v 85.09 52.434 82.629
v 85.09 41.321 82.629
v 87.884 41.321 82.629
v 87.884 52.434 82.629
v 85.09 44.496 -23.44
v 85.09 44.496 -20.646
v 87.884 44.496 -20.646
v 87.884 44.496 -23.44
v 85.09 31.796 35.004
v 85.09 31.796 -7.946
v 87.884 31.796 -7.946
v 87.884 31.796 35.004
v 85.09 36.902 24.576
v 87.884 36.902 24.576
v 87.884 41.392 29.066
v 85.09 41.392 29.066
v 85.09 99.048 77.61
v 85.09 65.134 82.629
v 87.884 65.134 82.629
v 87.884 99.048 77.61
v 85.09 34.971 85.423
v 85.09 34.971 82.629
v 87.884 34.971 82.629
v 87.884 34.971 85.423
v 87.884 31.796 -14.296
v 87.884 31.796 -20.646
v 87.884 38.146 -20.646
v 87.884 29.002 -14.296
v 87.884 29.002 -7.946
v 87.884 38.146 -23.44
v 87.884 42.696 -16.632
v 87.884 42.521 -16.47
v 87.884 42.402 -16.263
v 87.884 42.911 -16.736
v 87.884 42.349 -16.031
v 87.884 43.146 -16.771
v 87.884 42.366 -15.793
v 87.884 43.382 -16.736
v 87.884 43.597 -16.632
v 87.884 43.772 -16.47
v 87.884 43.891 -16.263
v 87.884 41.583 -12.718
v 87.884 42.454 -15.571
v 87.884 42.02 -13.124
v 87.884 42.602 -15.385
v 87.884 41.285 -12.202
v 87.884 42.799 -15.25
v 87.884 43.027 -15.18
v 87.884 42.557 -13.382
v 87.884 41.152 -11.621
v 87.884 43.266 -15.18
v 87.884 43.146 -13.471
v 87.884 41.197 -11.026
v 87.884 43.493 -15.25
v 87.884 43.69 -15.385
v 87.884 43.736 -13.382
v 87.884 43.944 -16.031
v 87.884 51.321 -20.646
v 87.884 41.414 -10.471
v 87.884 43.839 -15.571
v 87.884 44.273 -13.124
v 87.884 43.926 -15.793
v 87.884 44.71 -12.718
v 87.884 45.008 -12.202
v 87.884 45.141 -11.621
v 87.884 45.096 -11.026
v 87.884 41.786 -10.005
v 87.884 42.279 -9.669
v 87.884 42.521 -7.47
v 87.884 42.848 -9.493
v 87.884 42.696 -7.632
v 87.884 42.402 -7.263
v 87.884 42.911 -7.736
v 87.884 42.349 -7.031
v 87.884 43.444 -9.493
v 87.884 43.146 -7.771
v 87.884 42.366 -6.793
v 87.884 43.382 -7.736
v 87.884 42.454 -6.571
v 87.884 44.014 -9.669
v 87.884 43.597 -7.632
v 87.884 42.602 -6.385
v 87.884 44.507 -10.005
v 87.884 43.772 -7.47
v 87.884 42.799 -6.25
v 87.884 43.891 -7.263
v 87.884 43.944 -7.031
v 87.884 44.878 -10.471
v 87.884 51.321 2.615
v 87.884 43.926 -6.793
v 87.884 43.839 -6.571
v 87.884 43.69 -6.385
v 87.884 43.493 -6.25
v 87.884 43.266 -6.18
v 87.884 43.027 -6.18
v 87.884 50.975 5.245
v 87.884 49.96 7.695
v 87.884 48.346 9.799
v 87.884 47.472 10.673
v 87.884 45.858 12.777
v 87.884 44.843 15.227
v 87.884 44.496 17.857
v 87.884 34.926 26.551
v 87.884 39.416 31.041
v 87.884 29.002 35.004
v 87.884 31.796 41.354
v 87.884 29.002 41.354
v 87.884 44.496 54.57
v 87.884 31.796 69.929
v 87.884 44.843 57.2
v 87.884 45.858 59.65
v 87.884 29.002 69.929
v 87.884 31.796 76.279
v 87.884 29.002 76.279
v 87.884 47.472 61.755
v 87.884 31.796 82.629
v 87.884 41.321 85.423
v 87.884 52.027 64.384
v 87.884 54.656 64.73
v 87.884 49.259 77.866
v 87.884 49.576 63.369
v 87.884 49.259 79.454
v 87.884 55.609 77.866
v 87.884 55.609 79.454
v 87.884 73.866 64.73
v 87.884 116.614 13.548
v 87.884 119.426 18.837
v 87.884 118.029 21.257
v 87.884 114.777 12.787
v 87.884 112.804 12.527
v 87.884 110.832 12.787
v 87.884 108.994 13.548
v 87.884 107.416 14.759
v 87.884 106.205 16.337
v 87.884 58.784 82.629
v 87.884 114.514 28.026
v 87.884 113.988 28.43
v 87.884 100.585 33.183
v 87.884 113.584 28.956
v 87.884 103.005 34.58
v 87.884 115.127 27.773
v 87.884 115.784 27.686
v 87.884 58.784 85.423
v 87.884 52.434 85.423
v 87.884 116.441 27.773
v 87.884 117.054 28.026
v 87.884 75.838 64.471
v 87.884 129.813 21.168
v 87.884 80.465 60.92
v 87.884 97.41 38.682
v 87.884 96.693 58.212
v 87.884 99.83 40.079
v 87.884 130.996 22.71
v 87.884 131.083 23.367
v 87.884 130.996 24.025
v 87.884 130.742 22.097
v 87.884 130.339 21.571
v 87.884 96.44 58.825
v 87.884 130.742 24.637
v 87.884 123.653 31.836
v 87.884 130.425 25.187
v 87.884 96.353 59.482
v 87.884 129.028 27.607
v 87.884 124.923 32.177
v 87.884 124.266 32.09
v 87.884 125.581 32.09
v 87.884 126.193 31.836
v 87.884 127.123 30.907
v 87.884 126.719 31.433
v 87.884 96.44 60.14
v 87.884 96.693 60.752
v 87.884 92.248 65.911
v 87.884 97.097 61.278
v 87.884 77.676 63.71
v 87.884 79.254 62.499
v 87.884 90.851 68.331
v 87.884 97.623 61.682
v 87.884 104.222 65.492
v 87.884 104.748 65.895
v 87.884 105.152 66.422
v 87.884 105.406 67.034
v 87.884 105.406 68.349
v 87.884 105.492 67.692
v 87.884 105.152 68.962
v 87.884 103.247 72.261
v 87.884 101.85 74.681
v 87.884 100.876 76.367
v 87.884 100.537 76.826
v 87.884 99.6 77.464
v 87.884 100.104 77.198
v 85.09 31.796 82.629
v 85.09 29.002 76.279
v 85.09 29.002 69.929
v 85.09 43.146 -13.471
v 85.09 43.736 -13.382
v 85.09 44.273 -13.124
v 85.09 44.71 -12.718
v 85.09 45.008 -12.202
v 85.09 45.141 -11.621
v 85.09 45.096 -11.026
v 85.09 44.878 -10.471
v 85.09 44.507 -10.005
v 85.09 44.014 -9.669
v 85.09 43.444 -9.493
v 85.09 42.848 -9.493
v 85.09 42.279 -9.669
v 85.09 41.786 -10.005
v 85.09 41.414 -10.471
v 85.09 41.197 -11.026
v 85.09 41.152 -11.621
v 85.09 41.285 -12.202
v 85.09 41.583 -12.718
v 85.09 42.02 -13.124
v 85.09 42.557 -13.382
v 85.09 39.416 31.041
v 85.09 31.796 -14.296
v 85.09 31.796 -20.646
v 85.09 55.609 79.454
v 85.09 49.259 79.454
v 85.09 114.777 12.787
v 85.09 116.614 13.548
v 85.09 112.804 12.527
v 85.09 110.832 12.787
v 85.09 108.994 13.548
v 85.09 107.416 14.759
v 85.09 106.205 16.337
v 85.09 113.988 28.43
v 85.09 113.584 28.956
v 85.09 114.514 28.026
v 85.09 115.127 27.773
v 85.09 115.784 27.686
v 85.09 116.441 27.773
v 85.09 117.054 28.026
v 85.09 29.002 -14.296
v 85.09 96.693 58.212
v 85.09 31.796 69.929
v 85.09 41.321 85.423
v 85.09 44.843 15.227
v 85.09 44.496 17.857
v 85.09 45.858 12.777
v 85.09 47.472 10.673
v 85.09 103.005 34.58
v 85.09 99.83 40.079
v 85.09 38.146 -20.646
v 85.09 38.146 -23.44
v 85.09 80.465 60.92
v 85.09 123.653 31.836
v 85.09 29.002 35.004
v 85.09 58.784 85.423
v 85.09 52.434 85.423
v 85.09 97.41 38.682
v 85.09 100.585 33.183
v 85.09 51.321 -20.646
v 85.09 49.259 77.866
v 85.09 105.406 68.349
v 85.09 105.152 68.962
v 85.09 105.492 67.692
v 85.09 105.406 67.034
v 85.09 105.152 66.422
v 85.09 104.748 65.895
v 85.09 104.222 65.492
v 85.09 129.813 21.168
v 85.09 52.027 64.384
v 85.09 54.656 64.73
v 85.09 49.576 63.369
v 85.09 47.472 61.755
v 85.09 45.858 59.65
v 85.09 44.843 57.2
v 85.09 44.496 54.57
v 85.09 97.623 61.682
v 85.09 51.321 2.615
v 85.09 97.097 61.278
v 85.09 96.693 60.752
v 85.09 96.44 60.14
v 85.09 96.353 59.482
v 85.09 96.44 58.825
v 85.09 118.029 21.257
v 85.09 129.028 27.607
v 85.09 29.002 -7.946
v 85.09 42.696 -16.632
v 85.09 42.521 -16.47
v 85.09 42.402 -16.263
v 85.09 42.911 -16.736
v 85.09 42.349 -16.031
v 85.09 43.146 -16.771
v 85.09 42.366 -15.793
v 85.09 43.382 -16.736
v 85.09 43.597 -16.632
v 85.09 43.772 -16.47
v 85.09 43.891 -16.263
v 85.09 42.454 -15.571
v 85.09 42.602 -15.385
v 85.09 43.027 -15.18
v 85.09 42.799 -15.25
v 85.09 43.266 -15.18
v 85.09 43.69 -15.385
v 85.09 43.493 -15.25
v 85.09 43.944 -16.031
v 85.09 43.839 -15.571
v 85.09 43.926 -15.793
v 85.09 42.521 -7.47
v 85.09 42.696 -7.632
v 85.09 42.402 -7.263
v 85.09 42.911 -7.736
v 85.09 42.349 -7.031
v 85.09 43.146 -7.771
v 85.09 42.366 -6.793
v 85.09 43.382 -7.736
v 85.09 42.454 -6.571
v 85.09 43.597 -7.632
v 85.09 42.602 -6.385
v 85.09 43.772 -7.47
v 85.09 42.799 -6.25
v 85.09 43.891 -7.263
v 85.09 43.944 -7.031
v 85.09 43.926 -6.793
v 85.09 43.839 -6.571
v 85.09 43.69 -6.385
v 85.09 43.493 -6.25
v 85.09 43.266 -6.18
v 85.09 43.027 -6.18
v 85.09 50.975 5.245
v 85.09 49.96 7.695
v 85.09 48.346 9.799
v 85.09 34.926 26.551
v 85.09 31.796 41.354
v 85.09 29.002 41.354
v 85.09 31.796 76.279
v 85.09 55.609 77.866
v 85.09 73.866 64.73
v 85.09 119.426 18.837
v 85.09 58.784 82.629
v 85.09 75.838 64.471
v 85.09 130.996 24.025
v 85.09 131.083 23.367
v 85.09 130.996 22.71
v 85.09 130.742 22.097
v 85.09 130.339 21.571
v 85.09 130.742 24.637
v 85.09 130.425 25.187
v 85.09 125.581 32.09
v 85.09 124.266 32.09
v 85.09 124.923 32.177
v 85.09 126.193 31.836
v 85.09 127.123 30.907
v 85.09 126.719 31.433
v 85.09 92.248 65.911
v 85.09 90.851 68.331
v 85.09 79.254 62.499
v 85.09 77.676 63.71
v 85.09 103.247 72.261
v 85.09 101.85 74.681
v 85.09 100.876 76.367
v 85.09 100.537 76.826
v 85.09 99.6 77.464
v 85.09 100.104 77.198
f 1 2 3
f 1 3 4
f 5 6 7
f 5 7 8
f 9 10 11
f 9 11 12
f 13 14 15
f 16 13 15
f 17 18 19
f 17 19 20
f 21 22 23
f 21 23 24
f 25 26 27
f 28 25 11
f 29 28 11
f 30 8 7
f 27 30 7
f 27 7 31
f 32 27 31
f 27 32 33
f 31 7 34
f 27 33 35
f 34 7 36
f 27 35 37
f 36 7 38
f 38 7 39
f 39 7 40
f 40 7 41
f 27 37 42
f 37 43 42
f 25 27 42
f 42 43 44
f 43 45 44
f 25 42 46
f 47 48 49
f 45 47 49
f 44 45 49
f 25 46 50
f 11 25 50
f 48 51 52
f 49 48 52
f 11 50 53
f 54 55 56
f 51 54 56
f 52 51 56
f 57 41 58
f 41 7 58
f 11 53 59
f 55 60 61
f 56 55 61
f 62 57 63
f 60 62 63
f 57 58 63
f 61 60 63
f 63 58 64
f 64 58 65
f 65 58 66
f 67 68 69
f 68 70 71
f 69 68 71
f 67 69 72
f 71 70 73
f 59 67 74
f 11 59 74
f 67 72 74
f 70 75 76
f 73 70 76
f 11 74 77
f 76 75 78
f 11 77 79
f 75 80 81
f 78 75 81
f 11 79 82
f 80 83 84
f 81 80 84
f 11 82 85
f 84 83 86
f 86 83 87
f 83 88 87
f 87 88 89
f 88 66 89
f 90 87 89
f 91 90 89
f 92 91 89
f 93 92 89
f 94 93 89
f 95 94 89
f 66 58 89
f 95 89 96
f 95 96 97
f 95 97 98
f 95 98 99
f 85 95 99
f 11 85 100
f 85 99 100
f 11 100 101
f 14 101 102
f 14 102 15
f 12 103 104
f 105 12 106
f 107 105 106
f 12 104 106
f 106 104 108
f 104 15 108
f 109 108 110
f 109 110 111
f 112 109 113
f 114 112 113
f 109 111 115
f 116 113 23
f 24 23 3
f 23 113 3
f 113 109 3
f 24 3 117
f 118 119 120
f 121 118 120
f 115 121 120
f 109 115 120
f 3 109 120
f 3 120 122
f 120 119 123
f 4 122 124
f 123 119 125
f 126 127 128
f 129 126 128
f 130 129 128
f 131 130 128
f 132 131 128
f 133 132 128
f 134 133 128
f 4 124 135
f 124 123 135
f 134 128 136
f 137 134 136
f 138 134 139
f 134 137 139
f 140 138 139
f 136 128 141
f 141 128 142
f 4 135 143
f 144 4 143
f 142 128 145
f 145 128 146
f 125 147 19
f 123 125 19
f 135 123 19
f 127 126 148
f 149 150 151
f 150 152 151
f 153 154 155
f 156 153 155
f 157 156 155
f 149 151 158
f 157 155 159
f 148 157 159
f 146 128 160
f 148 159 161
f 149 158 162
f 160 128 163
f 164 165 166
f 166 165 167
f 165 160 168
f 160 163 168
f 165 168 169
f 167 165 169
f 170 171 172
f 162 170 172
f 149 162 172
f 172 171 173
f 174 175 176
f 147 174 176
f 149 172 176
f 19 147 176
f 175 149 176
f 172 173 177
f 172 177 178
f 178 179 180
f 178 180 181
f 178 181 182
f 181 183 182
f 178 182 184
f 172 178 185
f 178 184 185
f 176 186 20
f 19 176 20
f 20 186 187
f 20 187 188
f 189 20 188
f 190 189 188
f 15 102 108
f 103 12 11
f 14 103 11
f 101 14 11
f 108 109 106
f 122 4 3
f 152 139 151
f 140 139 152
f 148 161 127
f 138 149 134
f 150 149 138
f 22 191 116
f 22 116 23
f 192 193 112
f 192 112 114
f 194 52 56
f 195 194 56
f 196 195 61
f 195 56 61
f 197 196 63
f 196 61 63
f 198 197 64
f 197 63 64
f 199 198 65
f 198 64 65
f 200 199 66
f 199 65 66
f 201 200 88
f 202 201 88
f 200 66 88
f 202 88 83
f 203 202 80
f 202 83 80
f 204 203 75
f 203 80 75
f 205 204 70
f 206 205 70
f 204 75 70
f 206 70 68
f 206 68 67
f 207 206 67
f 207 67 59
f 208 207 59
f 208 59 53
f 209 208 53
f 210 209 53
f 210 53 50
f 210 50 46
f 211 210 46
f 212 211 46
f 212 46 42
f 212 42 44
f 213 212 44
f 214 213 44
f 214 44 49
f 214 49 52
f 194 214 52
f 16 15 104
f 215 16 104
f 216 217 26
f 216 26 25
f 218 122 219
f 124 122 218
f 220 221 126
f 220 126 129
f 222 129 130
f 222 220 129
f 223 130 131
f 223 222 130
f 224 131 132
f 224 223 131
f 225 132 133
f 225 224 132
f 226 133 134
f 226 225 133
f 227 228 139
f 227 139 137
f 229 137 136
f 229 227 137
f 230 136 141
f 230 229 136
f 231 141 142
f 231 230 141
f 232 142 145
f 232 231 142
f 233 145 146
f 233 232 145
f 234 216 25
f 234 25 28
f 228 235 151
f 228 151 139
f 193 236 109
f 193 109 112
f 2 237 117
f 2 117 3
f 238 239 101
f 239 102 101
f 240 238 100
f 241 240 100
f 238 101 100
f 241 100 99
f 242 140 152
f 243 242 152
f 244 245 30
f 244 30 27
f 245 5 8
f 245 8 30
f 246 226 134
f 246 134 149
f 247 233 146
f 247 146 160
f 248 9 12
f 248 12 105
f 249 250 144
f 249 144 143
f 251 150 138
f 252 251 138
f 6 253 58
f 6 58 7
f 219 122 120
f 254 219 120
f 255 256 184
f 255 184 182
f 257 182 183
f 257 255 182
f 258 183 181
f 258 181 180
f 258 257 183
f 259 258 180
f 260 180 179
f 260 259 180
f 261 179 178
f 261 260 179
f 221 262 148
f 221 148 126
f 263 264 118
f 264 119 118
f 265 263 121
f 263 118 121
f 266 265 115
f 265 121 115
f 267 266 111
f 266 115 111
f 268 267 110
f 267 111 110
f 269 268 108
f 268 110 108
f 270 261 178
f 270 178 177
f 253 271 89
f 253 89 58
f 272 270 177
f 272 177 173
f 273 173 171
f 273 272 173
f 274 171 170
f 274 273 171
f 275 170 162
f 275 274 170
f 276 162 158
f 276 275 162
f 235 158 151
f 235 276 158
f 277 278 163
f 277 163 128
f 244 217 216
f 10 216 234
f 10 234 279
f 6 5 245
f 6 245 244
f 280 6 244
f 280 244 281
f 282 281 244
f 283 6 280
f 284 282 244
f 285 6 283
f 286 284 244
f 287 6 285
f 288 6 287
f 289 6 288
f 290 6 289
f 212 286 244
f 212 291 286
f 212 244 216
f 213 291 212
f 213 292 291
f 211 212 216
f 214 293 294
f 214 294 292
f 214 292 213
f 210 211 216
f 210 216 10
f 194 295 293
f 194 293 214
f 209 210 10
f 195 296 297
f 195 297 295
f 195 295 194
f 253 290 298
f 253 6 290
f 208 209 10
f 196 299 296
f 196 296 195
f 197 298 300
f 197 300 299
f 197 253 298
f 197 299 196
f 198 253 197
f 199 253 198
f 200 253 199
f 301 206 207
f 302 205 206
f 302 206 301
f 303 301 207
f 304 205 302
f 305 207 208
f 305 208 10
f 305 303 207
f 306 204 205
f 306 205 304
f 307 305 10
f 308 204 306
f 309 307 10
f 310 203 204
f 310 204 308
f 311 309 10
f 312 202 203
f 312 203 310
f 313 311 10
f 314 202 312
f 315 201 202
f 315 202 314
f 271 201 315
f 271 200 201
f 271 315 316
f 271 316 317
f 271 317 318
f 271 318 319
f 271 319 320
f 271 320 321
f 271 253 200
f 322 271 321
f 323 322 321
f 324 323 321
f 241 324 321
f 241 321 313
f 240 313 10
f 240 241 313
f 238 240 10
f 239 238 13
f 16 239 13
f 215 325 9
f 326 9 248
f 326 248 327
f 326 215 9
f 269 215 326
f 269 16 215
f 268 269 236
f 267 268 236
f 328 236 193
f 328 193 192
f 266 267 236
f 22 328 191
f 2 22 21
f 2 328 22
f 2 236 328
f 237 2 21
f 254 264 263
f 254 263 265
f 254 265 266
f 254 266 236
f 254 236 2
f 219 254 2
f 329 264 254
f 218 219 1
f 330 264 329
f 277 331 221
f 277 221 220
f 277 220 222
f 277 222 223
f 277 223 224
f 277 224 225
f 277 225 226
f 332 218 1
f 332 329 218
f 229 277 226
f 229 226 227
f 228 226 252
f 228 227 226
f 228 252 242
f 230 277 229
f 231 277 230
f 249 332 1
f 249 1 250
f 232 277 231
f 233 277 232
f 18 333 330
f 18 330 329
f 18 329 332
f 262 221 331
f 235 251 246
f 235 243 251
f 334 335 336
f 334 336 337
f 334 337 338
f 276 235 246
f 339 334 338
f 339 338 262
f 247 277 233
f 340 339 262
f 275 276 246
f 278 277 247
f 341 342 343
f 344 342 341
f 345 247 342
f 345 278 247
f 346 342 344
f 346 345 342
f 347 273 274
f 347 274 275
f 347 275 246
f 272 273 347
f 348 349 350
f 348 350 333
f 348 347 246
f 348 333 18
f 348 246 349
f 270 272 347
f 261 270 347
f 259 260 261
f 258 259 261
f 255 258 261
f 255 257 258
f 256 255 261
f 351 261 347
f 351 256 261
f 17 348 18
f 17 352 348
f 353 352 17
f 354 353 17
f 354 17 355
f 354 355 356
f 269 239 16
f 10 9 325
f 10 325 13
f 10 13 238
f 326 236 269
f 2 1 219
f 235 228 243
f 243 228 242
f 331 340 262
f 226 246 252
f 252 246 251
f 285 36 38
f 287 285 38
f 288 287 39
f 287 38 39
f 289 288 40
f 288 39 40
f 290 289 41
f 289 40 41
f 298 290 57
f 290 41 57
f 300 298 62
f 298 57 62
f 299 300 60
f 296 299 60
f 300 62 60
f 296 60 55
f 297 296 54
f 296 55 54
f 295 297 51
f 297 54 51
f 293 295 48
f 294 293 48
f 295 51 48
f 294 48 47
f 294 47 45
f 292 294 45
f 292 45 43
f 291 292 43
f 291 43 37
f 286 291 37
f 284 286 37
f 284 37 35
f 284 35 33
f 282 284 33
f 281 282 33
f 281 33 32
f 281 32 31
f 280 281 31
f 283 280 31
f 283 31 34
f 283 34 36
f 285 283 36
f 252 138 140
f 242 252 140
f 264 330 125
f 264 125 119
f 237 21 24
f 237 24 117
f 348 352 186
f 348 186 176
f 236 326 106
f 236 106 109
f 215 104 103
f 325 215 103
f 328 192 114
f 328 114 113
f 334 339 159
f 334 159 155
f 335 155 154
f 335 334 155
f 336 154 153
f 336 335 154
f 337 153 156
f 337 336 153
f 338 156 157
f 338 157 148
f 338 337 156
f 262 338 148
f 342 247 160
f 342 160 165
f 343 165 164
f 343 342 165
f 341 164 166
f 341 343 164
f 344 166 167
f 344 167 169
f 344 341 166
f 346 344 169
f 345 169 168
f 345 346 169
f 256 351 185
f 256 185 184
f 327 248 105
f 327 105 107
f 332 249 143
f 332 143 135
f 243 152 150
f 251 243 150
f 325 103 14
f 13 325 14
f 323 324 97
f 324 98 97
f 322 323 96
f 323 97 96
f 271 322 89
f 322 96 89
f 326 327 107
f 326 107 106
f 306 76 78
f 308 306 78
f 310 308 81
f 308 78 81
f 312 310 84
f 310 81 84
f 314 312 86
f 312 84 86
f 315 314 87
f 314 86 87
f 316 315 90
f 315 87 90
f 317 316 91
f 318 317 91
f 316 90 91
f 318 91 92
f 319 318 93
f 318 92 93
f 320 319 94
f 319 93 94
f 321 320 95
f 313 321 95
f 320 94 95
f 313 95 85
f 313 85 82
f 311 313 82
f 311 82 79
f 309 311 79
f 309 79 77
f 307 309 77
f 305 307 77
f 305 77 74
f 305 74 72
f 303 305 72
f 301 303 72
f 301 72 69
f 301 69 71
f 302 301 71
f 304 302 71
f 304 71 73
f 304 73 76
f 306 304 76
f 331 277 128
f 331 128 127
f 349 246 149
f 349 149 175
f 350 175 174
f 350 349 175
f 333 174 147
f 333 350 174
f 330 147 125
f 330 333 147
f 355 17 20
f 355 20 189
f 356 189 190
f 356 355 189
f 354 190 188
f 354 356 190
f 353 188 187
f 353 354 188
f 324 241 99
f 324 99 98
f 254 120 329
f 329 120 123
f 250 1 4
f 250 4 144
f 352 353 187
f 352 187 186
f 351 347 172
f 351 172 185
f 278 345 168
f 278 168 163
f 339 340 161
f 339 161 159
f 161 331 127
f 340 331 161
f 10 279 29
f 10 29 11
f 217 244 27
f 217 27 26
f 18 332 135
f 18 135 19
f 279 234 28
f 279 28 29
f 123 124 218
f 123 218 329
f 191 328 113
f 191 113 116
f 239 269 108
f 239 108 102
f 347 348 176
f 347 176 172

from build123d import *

# Parameters (mm, degrees)
BOSS_EXTRUDE1_DEPTH = 2.794
SKETCH2_R           = 2
SKETCH2_R_2         = 0.8
SKETCH2_W           = 1.5875
SKETCH2_H           = 6.35
CUT_EXTRUDE1_DEPTH  = 157.484941985
FILLET1_R           = 10.16


with BuildPart() as part:
    # Sketch1 → Boss-Extrude1 (new body)
    with BuildSketch(Plane(origin=(85.09, 0, 0), x_dir=(0, 0, -1), z_dir=(1, 0, 0))):
        with BuildLine():
            Line((-64.730392893, 73.865929303), (-64.730392893, 44.496360983))
            Line((-64.730392893, 44.496360983), (-13.648686174, 44.496360983))
            Line((-13.648686174, 44.496360983), (-6.823686174, 51.321360983))
            Line((-6.823686174, 51.321360983), (20.646158347, 51.321360983))
            Line((20.646158347, 51.321360983), (20.646158347, 44.496360983))
            Line((20.646158347, 44.496360983), (23.440158347, 44.496360983))
            Line((23.440158347, 44.496360983), (23.440158347, 38.146360983))
            Line((23.440158347, 38.146360983), (20.646158347, 38.146360983))
            Line((20.646158347, 38.146360983), (20.646158347, 31.796360983))
            Line((20.646158347, 31.796360983), (14.296158347, 31.796360983))
            Line((14.296158347, 31.796360983), (14.296158347, 29.002360983))
            Line((14.296158347, 29.002360983), (7.946158347, 29.002360983))
            Line((7.946158347, 29.002360983), (7.946158347, 31.796360983))
            Line((7.946158347, 31.796360983), (-35.003841653, 31.796360983))
            Line((-35.003841653, 31.796360983), (-35.003841653, 29.002360983))
            Line((-35.003841653, 29.002360983), (-41.353841653, 29.002360983))
            Line((-41.353841653, 29.002360983), (-41.353841653, 31.796360983))
            Line((-41.353841653, 31.796360983), (-69.928841653, 31.796360983))
            Line((-69.928841653, 31.796360983), (-69.928841653, 29.002360983))
            Line((-69.928841653, 29.002360983), (-76.278841653, 29.002360983))
            Line((-76.278841653, 29.002360983), (-76.278841653, 31.796360983))
            Line((-76.278841653, 31.796360983), (-82.628841653, 31.796360983))
            Line((-82.628841653, 31.796360983), (-82.628841653, 34.971360983))
            Line((-82.628841653, 34.971360983), (-85.422841653, 34.971360983))
            Line((-85.422841653, 34.971360983), (-85.422841653, 41.321360983))
            Line((-85.422841653, 41.321360983), (-82.628841653, 41.321360983))
            Line((-82.628841653, 41.321360983), (-82.628841653, 52.433860983))
            Line((-82.628841653, 52.433860983), (-85.422841653, 52.433860983))
            Line((-85.422841653, 52.433860983), (-85.422841653, 58.783860983))
            Line((-85.422841653, 58.783860983), (-82.628841653, 58.783860983))
            Line((-82.628841653, 58.783860983), (-82.628841653, 65.133860983))
            Line((-82.628841653, 65.133860983), (-77.61007114, 99.048207683))
            ThreePointArc((-77.61007114, 99.048207683), (-77.197997978, 100.104395563), (-76.367434478, 100.876082938))
            Line((-76.367434478, 100.876082938), (-74.680762236, 101.849883611))
            Line((-74.680762236, 101.849883611), (-68.330762236, 90.851360983))
            Line((-68.330762236, 90.851360983), (-65.911087258, 92.248360983))
            Line((-65.911087258, 92.248360983), (-72.261087258, 103.246883611))
            Line((-72.261087258, 103.246883611), (-68.96153047, 105.151883611))
            ThreePointArc((-68.96153047, 105.151883611), (-67.034130095, 105.405630684), (-65.491825944, 104.222179085))
            Line((-65.491825944, 104.222179085), (-61.681825944, 97.623065508))
            ThreePointArc((-61.681825944, 97.623065508), (-60.139521793, 96.439613909), (-58.212121418, 96.693360983))
            Line((-58.212121418, 96.693360983), (-28.956051228, 113.584360983))
            ThreePointArc((-28.956051228, 113.584360983), (-27.772599629, 115.126665134), (-28.026346702, 117.054065508))
            Line((-28.026346702, 117.054065508), (-31.836346702, 123.653179085))
            ThreePointArc((-31.836346702, 123.653179085), (-32.090093775, 125.58057946), (-30.906642177, 127.122883611))
            Line((-30.906642177, 127.122883611), (-27.607085388, 129.027883611))
            Line((-27.607085388, 129.027883611), (-21.257085388, 118.029360983))
            Line((-21.257085388, 118.029360983), (-18.83741041, 119.426360983))
            Line((-18.83741041, 119.426360983), (-25.18741041, 130.424883611))
            Line((-25.18741041, 130.424883611), (-24.637484279, 130.742383611))
            ThreePointArc((-24.637484279, 130.742383611), (-22.710083904, 130.996130684), (-21.167779753, 129.812679085))
            Line((-21.167779753, 129.812679085), (-13.547779753, 116.614451931))
            ThreePointArc((-13.547779753, 116.614451931), (-12.786538533, 110.832250808), (-16.33689333, 106.205338355))
            Line((-16.33689333, 106.205338355), (-60.920392893, 80.46504288))
            ThreePointArc((-60.920392893, 80.46504288), (-63.70950647, 77.675929303), (-64.730392893, 73.865929303))
        make_face()
    extrude(amount=BOSS_EXTRUDE1_DEPTH)

    # Sketch2 → Cut-Extrude1 (cut, through all)
    with BuildSketch(Plane(origin=(87.884, 0, 0), x_dir=(0, 0, -1), z_dir=(1, 0, 0))):
        with Locations((11.471158347, 43.146360983)):
            Circle(SKETCH2_R)
        with Locations((15.971158347, 43.146360983)):
            Circle(SKETCH2_R_2)
        with Locations((6.971158347, 43.146360983)):
            Circle(SKETCH2_R_2)
        Polygon((-24.575557246, 36.901889269), (-29.065685306, 41.392017329), (-31.041341653, 39.416360983), (-26.551213592, 34.926232922), align=None)
        with Locations((-78.660091653, 52.433860983)):
            Rectangle(SKETCH2_W, SKETCH2_H)
        Polygon((-38.682130644, 97.41042469), (-33.18286933, 100.58542469), (-34.57986933, 103.005099669), (-40.079130644, 99.830099669), align=None)
    extrude(amount=-CUT_EXTRUDE1_DEPTH, mode=Mode.SUBTRACT)

    # Fillet1
    fillet1_edges = [part.edges().sort_by_distance(p)[0] for p in [
        (86.487, 44.496360983, 64.730392893),
        (86.487, 44.496360983, 13.648686174),
        (86.487, 51.321360983, 6.823686174),
    ]]
    fillet(fillet1_edges, radius=FILLET1_R)


solid = part.part
